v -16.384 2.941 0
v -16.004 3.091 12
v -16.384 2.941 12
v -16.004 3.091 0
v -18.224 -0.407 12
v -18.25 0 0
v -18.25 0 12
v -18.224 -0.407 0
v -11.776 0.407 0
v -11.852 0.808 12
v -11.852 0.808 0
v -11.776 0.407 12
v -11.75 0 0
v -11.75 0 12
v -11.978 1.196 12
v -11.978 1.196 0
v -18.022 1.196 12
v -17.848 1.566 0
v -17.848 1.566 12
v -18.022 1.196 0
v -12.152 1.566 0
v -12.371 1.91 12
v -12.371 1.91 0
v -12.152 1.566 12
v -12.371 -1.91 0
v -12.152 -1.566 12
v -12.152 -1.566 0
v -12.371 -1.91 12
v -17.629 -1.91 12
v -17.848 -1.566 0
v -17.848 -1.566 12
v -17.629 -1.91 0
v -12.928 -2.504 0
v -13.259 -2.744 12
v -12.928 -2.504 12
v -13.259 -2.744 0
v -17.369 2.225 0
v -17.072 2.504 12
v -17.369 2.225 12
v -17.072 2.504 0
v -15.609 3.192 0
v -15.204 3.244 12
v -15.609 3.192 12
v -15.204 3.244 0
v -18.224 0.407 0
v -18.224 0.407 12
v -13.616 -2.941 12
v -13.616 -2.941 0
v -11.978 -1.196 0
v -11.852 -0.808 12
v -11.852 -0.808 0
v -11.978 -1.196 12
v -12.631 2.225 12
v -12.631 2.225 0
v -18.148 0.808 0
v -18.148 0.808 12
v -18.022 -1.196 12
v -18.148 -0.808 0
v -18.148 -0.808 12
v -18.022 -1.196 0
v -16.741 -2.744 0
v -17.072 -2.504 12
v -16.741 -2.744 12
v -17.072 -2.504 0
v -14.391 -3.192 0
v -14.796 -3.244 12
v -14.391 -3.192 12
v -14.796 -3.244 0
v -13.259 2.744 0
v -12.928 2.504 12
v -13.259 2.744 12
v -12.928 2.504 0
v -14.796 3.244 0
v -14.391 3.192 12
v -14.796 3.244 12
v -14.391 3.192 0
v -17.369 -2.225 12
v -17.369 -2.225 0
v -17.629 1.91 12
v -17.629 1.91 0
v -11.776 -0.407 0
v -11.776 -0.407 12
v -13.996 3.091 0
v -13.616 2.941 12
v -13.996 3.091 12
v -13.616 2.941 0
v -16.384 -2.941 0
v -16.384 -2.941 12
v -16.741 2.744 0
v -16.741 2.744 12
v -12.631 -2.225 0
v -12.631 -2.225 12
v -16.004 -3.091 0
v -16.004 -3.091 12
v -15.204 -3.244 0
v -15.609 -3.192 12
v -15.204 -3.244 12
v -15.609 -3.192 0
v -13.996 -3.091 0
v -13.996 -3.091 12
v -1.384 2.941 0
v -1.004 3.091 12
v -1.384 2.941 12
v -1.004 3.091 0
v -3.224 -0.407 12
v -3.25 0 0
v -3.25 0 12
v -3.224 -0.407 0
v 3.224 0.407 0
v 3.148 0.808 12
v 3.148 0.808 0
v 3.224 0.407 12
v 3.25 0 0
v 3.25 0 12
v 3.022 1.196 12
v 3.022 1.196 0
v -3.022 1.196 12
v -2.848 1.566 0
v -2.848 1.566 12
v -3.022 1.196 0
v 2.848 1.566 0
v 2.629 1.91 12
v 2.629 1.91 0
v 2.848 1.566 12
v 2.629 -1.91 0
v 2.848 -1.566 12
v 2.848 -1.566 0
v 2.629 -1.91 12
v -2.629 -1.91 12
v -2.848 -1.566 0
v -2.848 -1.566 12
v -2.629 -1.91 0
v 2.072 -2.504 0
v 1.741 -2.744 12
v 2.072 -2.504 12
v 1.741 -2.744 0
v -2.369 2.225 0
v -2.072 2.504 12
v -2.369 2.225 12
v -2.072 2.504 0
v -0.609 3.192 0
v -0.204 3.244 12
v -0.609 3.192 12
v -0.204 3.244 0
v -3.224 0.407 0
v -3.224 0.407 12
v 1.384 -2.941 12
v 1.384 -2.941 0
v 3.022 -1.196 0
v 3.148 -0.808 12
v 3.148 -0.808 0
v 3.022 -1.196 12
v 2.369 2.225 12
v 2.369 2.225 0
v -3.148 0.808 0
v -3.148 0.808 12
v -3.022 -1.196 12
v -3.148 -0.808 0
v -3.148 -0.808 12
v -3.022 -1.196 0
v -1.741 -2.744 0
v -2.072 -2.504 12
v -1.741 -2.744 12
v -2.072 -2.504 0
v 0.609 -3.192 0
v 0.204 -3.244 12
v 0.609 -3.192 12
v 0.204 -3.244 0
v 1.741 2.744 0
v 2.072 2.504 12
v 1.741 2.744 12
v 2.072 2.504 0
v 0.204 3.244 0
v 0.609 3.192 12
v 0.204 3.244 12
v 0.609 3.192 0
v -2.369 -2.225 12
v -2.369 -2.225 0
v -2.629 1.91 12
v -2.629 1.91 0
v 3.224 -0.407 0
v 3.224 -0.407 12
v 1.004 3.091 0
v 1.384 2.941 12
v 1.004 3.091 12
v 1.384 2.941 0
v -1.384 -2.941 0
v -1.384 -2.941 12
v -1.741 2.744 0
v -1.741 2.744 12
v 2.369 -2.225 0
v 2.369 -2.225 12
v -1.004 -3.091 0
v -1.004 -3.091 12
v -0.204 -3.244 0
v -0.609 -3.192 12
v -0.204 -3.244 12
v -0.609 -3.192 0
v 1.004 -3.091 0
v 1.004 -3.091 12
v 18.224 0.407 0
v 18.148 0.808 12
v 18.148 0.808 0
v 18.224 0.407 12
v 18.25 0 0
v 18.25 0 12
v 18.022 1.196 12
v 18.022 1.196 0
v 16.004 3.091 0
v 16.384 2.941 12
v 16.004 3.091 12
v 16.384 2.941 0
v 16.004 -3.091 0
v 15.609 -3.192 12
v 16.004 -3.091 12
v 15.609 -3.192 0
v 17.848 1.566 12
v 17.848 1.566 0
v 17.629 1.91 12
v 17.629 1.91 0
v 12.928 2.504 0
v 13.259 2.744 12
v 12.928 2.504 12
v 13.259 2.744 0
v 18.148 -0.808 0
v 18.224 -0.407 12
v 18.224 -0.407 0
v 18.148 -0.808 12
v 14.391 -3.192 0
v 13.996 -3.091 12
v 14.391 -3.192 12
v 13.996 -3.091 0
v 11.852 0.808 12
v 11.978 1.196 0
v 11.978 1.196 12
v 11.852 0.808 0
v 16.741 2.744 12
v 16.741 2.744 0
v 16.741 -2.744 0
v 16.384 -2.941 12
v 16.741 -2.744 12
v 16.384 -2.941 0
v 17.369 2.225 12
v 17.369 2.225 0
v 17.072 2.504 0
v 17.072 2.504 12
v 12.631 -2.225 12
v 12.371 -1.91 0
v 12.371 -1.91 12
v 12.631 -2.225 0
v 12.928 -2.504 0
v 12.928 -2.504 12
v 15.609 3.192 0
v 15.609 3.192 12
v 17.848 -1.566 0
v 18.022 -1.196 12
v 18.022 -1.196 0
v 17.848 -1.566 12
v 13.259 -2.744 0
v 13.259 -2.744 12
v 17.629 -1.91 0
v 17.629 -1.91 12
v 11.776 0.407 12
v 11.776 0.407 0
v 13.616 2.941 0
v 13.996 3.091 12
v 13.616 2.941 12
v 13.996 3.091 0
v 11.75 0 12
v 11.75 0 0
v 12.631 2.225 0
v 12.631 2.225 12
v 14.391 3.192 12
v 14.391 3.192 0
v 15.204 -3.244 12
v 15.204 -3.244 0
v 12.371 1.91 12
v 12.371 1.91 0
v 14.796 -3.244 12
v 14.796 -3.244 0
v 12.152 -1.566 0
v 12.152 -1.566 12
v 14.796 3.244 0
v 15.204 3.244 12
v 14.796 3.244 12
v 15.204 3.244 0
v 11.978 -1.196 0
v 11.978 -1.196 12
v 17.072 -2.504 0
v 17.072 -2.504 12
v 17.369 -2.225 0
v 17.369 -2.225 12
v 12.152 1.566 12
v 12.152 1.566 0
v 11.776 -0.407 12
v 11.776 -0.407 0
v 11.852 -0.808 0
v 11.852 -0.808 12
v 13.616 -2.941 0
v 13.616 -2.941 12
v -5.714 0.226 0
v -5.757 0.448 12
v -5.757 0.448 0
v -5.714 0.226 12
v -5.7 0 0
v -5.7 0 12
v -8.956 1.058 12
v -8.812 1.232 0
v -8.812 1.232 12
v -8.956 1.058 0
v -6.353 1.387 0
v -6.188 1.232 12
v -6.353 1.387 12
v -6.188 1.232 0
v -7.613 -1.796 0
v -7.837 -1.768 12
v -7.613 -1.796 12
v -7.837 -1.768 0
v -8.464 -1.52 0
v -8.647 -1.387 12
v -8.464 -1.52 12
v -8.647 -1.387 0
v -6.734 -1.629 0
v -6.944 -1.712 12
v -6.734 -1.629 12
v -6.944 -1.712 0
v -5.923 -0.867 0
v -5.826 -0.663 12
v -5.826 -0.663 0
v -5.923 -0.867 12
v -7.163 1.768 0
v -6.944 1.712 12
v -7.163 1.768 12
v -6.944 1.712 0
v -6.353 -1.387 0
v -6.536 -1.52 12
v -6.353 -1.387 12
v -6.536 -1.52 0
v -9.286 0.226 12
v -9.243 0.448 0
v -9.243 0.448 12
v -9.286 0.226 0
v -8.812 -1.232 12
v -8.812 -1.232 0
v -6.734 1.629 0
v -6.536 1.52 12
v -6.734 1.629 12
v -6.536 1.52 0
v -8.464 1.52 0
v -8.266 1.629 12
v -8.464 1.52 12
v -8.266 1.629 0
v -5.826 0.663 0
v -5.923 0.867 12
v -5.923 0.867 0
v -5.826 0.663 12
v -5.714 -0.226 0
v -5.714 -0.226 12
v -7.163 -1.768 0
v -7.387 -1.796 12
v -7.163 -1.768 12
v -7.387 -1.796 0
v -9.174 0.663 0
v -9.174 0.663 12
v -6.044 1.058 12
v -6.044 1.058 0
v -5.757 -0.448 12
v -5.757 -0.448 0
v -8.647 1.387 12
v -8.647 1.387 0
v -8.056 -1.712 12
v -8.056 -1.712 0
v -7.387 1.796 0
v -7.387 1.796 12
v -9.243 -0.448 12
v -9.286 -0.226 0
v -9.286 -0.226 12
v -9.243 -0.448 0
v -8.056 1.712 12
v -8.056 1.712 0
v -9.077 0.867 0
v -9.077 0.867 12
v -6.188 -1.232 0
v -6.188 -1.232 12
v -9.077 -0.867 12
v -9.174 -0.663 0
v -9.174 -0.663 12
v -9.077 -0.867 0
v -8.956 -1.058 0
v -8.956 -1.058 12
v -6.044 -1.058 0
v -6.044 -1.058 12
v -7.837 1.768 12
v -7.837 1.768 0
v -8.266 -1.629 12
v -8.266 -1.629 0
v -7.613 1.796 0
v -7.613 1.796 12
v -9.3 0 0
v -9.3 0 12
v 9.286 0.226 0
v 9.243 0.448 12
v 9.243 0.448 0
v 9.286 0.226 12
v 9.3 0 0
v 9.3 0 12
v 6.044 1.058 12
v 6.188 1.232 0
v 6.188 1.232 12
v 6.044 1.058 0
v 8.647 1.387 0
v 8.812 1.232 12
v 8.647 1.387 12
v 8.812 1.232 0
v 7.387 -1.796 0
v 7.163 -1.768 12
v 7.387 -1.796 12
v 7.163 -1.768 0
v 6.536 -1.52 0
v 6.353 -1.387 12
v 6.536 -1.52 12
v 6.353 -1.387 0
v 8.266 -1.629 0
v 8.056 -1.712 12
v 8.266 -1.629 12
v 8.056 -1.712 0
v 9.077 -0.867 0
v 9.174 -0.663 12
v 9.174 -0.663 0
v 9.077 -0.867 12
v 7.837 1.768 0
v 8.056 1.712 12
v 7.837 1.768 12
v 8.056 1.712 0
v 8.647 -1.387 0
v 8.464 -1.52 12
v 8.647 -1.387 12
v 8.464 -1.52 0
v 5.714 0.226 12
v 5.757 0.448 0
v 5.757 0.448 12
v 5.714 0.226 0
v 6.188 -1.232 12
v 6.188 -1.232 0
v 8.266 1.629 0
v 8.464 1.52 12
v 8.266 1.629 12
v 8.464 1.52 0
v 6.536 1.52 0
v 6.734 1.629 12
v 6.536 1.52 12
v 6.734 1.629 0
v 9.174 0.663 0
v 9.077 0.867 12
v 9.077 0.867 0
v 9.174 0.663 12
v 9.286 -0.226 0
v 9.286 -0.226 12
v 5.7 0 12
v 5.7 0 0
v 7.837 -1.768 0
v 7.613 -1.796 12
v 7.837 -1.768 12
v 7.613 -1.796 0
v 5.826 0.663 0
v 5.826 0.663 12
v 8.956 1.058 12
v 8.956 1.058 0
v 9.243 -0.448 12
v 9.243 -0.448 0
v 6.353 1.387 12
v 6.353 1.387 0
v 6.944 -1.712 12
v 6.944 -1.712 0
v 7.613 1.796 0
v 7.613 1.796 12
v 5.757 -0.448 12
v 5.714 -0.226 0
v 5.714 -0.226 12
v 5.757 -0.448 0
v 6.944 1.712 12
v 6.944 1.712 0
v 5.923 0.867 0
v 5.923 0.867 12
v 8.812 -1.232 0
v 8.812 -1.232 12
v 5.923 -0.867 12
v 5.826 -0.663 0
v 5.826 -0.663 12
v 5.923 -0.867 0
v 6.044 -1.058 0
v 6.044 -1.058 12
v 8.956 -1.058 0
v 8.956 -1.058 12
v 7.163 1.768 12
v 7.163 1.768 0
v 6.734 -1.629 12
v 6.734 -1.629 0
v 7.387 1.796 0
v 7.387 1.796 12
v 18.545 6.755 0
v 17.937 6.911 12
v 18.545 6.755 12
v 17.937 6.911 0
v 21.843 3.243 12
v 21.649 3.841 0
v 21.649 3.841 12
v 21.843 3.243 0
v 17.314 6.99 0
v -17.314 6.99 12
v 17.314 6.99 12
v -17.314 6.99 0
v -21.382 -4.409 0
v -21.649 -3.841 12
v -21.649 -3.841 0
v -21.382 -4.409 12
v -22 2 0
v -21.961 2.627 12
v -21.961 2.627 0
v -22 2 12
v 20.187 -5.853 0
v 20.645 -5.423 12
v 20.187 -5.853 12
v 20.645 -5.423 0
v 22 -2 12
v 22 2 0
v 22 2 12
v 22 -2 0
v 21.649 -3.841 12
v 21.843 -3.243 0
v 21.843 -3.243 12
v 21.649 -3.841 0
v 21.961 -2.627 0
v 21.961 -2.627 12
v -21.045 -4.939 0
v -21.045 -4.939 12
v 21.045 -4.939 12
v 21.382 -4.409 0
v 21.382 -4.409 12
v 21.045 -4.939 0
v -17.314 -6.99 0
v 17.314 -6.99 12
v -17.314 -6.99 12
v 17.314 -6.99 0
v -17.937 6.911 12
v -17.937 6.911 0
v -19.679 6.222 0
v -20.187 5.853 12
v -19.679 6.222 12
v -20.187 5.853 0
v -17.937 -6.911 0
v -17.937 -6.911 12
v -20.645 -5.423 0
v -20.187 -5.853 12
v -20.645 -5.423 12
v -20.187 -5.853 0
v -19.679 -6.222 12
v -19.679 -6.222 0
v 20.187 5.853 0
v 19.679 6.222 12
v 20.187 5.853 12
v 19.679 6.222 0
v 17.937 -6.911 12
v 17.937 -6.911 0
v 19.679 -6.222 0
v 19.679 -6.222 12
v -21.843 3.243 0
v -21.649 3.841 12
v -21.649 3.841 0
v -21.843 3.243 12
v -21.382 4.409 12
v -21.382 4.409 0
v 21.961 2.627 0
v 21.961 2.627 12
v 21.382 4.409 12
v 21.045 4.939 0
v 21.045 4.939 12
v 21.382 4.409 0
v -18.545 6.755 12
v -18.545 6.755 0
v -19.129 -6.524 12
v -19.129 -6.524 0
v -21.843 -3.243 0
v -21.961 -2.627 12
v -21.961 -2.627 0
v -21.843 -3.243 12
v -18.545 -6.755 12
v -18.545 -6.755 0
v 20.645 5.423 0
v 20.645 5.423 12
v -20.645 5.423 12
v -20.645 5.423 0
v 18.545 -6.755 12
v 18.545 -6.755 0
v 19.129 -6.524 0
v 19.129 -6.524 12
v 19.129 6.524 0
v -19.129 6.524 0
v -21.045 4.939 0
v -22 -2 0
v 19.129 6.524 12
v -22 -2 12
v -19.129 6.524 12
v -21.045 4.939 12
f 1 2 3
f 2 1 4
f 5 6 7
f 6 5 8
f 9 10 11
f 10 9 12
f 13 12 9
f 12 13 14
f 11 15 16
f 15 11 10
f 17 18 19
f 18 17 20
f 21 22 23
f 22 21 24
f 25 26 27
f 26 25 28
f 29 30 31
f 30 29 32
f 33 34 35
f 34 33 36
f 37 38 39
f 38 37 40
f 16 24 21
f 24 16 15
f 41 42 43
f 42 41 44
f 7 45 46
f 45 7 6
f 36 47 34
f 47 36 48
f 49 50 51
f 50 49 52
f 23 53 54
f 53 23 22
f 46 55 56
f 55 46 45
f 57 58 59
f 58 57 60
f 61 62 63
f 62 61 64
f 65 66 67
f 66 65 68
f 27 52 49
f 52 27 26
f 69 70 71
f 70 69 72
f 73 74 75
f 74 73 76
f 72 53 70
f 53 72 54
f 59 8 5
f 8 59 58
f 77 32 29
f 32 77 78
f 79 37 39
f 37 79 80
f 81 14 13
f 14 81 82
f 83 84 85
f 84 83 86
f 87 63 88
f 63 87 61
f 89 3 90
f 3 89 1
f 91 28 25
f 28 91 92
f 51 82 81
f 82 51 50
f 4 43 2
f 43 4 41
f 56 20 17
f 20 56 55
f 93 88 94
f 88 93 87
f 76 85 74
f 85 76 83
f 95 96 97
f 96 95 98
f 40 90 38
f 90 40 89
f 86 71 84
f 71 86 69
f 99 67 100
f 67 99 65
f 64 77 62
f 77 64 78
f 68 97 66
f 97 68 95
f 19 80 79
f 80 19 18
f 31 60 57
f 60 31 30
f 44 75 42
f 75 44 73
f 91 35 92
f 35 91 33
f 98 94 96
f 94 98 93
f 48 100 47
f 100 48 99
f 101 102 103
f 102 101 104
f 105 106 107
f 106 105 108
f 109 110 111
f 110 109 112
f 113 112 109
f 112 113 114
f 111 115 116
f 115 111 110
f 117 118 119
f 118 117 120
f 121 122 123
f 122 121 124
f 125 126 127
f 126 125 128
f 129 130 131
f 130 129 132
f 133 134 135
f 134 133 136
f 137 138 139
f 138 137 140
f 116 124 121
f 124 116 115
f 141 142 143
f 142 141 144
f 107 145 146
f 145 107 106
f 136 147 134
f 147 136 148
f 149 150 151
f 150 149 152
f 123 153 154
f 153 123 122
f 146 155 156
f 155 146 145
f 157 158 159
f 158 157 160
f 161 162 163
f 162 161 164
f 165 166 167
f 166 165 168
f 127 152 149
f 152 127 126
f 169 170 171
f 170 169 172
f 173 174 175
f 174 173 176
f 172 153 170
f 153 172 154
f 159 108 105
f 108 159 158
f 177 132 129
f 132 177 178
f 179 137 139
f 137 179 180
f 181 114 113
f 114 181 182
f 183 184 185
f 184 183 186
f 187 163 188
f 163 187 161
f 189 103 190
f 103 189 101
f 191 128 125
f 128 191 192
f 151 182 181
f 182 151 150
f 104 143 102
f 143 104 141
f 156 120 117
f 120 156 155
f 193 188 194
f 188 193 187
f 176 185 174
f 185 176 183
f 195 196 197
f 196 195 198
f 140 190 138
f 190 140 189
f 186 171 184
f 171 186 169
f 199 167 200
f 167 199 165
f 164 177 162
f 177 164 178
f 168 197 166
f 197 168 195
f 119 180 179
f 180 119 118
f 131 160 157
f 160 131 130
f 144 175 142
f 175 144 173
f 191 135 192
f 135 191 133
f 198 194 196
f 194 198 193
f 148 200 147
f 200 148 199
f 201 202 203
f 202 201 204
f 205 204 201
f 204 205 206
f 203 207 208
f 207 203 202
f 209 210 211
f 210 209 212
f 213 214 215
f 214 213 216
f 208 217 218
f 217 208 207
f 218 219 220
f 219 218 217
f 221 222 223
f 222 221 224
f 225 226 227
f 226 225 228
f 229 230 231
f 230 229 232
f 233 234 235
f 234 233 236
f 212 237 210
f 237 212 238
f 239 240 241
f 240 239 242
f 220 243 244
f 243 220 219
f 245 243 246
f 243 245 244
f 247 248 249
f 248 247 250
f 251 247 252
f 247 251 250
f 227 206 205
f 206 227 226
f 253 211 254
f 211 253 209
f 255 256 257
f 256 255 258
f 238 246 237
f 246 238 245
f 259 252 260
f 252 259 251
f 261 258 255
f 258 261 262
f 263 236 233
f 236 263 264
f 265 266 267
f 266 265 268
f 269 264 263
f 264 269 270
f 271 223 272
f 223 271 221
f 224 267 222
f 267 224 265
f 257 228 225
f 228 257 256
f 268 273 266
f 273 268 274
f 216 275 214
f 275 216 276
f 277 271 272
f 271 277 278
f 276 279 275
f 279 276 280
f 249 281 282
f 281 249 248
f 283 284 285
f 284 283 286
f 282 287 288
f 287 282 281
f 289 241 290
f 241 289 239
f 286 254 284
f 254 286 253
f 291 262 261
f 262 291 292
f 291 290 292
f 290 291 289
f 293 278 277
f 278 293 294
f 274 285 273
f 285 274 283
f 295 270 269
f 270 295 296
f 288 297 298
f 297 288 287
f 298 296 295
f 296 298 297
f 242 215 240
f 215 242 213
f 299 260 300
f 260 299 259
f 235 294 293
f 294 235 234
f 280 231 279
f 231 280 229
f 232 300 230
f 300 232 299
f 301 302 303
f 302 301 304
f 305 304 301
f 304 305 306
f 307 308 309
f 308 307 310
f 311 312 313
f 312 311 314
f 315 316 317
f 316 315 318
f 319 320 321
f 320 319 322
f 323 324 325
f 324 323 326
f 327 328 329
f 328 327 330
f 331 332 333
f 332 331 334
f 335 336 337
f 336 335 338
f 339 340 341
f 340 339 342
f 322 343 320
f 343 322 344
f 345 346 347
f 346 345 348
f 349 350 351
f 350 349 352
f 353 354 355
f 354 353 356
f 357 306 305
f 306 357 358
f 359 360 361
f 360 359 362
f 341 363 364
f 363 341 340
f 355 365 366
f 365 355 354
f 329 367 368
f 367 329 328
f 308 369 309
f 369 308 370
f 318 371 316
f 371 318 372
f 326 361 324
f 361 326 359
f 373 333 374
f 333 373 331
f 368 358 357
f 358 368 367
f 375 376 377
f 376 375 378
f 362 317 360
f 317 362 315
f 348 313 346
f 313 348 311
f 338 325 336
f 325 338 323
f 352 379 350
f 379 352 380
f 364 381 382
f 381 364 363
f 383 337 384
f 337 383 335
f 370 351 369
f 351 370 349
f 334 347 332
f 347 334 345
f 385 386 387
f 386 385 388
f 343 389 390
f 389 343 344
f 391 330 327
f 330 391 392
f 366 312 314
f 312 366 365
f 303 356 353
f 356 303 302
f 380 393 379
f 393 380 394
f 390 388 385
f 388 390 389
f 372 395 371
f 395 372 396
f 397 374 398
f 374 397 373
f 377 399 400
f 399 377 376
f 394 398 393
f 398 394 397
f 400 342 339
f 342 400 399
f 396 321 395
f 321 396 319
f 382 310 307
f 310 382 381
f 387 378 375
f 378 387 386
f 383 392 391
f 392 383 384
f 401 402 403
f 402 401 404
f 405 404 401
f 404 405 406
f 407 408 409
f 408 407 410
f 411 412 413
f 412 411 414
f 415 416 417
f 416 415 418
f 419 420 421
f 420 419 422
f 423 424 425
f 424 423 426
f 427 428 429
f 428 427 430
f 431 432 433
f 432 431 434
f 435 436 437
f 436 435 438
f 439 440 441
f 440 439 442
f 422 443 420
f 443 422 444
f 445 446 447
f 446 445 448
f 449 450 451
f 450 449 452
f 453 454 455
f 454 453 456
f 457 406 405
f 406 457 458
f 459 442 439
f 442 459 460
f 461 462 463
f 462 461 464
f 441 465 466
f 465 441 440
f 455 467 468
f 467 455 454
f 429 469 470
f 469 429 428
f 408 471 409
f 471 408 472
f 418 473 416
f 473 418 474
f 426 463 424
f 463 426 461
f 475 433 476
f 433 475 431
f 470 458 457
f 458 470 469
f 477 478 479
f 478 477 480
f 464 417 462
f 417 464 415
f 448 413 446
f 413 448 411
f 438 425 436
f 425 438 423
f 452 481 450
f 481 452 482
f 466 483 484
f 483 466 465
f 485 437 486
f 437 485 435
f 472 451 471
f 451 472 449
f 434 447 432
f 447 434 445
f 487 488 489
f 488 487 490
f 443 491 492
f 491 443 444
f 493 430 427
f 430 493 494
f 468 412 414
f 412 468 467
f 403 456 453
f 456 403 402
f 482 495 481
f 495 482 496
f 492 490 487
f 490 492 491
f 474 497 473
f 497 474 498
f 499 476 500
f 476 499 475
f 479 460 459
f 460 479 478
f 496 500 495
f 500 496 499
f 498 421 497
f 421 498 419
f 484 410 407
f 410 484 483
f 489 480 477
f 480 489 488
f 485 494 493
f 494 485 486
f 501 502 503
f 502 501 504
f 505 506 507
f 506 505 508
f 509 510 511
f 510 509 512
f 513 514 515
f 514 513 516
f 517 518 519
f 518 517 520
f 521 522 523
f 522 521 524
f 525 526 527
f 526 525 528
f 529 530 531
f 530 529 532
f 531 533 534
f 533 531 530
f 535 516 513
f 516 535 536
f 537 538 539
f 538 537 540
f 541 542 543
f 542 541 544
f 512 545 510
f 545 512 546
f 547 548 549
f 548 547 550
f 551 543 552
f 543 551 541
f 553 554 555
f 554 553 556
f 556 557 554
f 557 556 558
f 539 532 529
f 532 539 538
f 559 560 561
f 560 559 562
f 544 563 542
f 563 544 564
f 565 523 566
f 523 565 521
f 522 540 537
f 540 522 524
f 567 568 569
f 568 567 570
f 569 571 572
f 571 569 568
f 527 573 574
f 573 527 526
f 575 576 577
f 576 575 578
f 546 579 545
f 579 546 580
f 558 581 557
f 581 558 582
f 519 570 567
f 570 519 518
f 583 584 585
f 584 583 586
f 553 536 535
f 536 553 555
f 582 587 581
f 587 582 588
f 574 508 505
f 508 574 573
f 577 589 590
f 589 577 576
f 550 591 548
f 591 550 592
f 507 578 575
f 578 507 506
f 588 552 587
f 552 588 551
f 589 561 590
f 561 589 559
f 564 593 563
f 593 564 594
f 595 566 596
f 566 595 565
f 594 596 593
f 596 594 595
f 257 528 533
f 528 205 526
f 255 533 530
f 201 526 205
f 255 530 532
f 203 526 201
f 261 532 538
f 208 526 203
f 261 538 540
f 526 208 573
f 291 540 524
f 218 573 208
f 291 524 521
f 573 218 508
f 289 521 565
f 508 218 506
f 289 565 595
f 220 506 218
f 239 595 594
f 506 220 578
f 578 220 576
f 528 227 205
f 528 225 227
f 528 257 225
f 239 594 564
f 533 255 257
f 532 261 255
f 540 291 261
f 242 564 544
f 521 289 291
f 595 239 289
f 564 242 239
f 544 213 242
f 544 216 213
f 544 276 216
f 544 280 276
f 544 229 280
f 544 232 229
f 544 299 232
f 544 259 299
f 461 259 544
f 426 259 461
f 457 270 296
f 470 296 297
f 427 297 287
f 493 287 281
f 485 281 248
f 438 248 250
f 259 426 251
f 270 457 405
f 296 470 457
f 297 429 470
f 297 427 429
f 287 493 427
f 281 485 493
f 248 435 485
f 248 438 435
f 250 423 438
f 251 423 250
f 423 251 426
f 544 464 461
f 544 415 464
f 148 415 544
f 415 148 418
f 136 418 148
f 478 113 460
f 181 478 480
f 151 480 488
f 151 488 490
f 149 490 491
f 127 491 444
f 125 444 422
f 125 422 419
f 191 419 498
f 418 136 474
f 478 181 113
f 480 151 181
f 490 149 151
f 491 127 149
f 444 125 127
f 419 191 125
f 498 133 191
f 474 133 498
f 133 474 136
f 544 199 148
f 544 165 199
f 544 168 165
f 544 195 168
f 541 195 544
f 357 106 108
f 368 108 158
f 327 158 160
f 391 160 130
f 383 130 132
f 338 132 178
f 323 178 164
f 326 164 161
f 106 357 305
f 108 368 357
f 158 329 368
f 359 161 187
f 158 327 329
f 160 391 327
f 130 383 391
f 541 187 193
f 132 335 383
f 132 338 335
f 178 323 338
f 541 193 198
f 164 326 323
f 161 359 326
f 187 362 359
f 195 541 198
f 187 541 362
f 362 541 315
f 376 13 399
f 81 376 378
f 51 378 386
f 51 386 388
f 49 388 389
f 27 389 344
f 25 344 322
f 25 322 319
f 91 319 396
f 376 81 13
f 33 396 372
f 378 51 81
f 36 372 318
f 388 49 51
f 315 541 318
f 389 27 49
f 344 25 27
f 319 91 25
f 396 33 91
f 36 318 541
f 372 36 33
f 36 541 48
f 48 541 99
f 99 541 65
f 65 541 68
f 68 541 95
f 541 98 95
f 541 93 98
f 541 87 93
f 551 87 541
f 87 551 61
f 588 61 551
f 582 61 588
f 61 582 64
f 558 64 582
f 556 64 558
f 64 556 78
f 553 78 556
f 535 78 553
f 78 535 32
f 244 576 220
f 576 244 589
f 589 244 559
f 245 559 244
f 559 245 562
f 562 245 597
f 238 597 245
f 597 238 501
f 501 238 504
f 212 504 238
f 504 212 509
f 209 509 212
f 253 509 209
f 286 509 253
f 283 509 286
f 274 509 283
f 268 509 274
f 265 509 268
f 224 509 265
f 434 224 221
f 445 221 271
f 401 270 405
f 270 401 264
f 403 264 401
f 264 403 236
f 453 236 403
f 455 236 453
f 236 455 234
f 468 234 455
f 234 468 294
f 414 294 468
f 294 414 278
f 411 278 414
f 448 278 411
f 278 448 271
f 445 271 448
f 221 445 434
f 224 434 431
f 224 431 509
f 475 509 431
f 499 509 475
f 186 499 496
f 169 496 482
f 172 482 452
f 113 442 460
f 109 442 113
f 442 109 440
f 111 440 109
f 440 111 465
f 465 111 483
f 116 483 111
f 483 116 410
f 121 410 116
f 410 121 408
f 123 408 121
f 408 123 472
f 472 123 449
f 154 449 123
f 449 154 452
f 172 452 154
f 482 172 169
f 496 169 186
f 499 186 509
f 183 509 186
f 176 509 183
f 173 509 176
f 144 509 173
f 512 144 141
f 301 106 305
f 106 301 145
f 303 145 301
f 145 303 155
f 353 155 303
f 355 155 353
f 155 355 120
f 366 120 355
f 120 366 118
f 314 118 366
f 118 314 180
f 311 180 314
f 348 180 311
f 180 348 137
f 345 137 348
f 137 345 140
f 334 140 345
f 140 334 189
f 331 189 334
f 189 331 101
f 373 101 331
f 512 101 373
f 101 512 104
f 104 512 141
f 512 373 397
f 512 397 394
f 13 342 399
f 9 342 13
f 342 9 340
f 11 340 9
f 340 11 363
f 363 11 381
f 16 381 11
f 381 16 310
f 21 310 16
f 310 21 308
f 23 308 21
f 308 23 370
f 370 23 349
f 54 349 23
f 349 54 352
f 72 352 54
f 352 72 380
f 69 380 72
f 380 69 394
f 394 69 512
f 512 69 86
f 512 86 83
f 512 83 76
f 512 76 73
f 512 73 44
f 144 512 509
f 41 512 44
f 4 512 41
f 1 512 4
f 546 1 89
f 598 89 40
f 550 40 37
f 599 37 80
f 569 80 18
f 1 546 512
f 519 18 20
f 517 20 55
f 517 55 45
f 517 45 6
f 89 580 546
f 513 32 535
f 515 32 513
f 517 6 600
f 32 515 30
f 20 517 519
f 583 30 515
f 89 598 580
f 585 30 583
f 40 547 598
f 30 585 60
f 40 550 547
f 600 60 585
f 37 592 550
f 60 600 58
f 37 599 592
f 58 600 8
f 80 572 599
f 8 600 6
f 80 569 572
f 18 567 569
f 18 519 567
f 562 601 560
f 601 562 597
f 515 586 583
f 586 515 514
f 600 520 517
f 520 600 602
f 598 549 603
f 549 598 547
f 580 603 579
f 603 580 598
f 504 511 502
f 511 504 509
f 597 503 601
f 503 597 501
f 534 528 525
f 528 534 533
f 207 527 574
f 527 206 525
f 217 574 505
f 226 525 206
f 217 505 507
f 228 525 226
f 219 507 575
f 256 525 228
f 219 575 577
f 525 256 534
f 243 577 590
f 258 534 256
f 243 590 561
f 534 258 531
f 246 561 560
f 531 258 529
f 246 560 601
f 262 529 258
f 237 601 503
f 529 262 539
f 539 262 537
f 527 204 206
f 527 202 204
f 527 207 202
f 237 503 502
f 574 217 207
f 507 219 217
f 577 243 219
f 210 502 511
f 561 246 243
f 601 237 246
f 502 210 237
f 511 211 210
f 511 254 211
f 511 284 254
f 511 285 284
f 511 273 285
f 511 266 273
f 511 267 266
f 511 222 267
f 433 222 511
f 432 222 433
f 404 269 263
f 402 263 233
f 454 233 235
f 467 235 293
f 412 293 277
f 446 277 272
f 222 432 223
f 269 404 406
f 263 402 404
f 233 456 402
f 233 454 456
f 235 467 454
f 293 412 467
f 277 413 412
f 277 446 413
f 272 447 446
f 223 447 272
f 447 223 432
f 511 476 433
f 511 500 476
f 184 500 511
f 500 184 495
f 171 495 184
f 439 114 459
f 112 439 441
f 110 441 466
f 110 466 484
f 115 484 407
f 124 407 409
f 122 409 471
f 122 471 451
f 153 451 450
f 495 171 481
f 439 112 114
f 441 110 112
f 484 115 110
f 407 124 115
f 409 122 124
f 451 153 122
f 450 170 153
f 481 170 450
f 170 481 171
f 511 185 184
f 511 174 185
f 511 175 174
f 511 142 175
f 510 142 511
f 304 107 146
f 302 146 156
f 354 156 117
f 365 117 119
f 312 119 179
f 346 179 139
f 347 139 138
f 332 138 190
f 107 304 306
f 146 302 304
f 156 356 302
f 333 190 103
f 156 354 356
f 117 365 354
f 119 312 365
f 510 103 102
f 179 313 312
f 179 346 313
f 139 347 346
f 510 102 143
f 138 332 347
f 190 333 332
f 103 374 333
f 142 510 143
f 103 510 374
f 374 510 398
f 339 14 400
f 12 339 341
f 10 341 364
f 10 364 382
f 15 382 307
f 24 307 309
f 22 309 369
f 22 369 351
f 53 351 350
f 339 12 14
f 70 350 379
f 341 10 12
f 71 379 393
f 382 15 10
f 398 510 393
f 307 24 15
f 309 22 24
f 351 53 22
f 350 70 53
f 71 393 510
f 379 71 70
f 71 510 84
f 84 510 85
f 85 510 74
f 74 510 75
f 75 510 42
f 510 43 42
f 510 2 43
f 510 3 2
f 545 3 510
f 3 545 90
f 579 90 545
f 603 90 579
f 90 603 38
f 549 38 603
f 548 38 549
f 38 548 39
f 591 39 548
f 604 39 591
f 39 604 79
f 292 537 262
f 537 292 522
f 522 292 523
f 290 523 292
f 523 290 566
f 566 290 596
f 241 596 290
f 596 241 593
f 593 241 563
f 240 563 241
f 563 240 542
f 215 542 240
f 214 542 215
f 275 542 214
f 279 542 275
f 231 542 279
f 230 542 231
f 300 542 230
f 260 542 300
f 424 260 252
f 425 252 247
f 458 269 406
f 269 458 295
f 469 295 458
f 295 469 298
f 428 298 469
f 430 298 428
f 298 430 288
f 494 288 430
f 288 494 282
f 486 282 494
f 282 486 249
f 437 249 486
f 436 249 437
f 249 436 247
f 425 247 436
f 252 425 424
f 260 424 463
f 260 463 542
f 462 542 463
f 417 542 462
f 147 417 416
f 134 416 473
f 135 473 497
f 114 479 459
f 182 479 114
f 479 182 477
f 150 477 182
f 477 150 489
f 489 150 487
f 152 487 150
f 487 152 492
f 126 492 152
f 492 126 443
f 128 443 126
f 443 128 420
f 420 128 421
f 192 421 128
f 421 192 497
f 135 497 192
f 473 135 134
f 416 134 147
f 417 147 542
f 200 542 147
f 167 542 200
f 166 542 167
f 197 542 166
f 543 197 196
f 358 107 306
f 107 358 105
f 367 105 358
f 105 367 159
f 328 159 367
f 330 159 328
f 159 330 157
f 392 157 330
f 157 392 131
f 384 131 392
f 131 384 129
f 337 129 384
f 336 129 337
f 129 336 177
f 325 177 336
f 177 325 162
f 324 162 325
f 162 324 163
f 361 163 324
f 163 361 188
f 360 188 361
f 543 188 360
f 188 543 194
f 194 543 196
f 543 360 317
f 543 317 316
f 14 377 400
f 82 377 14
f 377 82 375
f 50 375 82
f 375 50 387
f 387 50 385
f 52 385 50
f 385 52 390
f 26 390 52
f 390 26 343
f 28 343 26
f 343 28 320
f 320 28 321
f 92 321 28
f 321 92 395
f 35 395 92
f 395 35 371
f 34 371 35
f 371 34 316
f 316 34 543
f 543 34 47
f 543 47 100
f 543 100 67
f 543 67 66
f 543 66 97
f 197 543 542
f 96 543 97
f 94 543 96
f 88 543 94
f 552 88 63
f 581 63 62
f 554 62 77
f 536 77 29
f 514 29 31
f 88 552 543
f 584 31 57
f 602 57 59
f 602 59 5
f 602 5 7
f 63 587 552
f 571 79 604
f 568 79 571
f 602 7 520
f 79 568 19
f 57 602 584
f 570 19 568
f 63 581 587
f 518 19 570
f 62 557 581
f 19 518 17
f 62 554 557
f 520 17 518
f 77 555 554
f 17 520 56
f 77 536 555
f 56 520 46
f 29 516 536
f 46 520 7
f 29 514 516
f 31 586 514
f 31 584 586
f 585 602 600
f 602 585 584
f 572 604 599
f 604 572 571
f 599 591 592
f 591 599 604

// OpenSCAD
$fn = 50;


difference() {
	union() {
		*color(alpha = 1.0000000000, c = "gray") {
			translate(v = [0, 7, 0]) {
				linear_extrude(height = 1) {
					text(font = "Arial:style=Bold", halign = "center", size = 4.5000000000, text = "COMMENT plate main", valign = "center");
				}
			}
		}
		*color(alpha = 1.0000000000, c = "gray") {
			translate(v = [0, 14, 0]) {
				linear_extrude(height = 1) {
					text(font = "Arial:style=Bold", halign = "center", size = 4.5000000000, text = "COMMENT description oobb_plate_shape_p_type_12_depth_3_width_1_height_12_thickness_true_both_holes", valign = "center");
				}
			}
		}
		hull() {
			translate(v = [-17.0000000000, 2.0000000000, 0]) {
				cylinder(h = 12, r = 5);
			}
			translate(v = [17.0000000000, 2.0000000000, 0]) {
				cylinder(h = 12, r = 5);
			}
			translate(v = [-17.0000000000, -2.0000000000, 0]) {
				cylinder(h = 12, r = 5);
			}
			translate(v = [17.0000000000, -2.0000000000, 0]) {
				cylinder(h = 12, r = 5);
			}
		}
	}
	union() {
		*color(alpha = 1.0000000000, c = "gray") {
			translate(v = [0, 7, 0]) {
				linear_extrude(height = 1) {
					text(font = "Arial:style=Bold", halign = "center", size = 4.5000000000, text = "COMMENT holes main", valign = "center");
				}
			}
		}
		*color(alpha = 1.0000000000, c = "gray") {
			translate(v = [0, 14, 0]) {
				linear_extrude(height = 1) {
					text(font = "Arial:style=Bold", halign = "center", size = 4.5000000000, text = "COMMENT description oobb_holes_shape_n_type_3_width_1_height_12_thickness_true_both_holes", valign = "center");
				}
			}
		}
		translate(v = [-15.0000000000, 0.0000000000, 0]) {
			translate(v = [0, 0, -50]) {
				cylinder(h = 100, r = 3.2500000000);
			}
		}
		translate(v = [0, 0, -50]) {
			cylinder(h = 100, r = 3.2500000000);
		}
		translate(v = [15.0000000000, 0.0000000000, 0]) {
			translate(v = [0, 0, -50]) {
				cylinder(h = 100, r = 3.2500000000);
			}
		}
		translate(v = [-15.0000000000, 0.0000000000, 0]) {
			translate(v = [0, 0, -50]) {
				cylinder(h = 100, r = 1.8000000000);
			}
		}
		translate(v = [-7.5000000000, 0.0000000000, 0]) {
			translate(v = [0, 0, -50]) {
				cylinder(h = 100, r = 1.8000000000);
			}
		}
		translate(v = [0, 0, -50]) {
			cylinder(h = 100, r = 1.8000000000);
		}
		translate(v = [7.5000000000, 0.0000000000, 0]) {
			translate(v = [0, 0, -50]) {
				cylinder(h = 100, r = 1.8000000000);
			}
		}
		translate(v = [15.0000000000, 0.0000000000, 0]) {
			translate(v = [0, 0, -50]) {
				cylinder(h = 100, r = 1.8000000000);
			}
		}
	}
}
